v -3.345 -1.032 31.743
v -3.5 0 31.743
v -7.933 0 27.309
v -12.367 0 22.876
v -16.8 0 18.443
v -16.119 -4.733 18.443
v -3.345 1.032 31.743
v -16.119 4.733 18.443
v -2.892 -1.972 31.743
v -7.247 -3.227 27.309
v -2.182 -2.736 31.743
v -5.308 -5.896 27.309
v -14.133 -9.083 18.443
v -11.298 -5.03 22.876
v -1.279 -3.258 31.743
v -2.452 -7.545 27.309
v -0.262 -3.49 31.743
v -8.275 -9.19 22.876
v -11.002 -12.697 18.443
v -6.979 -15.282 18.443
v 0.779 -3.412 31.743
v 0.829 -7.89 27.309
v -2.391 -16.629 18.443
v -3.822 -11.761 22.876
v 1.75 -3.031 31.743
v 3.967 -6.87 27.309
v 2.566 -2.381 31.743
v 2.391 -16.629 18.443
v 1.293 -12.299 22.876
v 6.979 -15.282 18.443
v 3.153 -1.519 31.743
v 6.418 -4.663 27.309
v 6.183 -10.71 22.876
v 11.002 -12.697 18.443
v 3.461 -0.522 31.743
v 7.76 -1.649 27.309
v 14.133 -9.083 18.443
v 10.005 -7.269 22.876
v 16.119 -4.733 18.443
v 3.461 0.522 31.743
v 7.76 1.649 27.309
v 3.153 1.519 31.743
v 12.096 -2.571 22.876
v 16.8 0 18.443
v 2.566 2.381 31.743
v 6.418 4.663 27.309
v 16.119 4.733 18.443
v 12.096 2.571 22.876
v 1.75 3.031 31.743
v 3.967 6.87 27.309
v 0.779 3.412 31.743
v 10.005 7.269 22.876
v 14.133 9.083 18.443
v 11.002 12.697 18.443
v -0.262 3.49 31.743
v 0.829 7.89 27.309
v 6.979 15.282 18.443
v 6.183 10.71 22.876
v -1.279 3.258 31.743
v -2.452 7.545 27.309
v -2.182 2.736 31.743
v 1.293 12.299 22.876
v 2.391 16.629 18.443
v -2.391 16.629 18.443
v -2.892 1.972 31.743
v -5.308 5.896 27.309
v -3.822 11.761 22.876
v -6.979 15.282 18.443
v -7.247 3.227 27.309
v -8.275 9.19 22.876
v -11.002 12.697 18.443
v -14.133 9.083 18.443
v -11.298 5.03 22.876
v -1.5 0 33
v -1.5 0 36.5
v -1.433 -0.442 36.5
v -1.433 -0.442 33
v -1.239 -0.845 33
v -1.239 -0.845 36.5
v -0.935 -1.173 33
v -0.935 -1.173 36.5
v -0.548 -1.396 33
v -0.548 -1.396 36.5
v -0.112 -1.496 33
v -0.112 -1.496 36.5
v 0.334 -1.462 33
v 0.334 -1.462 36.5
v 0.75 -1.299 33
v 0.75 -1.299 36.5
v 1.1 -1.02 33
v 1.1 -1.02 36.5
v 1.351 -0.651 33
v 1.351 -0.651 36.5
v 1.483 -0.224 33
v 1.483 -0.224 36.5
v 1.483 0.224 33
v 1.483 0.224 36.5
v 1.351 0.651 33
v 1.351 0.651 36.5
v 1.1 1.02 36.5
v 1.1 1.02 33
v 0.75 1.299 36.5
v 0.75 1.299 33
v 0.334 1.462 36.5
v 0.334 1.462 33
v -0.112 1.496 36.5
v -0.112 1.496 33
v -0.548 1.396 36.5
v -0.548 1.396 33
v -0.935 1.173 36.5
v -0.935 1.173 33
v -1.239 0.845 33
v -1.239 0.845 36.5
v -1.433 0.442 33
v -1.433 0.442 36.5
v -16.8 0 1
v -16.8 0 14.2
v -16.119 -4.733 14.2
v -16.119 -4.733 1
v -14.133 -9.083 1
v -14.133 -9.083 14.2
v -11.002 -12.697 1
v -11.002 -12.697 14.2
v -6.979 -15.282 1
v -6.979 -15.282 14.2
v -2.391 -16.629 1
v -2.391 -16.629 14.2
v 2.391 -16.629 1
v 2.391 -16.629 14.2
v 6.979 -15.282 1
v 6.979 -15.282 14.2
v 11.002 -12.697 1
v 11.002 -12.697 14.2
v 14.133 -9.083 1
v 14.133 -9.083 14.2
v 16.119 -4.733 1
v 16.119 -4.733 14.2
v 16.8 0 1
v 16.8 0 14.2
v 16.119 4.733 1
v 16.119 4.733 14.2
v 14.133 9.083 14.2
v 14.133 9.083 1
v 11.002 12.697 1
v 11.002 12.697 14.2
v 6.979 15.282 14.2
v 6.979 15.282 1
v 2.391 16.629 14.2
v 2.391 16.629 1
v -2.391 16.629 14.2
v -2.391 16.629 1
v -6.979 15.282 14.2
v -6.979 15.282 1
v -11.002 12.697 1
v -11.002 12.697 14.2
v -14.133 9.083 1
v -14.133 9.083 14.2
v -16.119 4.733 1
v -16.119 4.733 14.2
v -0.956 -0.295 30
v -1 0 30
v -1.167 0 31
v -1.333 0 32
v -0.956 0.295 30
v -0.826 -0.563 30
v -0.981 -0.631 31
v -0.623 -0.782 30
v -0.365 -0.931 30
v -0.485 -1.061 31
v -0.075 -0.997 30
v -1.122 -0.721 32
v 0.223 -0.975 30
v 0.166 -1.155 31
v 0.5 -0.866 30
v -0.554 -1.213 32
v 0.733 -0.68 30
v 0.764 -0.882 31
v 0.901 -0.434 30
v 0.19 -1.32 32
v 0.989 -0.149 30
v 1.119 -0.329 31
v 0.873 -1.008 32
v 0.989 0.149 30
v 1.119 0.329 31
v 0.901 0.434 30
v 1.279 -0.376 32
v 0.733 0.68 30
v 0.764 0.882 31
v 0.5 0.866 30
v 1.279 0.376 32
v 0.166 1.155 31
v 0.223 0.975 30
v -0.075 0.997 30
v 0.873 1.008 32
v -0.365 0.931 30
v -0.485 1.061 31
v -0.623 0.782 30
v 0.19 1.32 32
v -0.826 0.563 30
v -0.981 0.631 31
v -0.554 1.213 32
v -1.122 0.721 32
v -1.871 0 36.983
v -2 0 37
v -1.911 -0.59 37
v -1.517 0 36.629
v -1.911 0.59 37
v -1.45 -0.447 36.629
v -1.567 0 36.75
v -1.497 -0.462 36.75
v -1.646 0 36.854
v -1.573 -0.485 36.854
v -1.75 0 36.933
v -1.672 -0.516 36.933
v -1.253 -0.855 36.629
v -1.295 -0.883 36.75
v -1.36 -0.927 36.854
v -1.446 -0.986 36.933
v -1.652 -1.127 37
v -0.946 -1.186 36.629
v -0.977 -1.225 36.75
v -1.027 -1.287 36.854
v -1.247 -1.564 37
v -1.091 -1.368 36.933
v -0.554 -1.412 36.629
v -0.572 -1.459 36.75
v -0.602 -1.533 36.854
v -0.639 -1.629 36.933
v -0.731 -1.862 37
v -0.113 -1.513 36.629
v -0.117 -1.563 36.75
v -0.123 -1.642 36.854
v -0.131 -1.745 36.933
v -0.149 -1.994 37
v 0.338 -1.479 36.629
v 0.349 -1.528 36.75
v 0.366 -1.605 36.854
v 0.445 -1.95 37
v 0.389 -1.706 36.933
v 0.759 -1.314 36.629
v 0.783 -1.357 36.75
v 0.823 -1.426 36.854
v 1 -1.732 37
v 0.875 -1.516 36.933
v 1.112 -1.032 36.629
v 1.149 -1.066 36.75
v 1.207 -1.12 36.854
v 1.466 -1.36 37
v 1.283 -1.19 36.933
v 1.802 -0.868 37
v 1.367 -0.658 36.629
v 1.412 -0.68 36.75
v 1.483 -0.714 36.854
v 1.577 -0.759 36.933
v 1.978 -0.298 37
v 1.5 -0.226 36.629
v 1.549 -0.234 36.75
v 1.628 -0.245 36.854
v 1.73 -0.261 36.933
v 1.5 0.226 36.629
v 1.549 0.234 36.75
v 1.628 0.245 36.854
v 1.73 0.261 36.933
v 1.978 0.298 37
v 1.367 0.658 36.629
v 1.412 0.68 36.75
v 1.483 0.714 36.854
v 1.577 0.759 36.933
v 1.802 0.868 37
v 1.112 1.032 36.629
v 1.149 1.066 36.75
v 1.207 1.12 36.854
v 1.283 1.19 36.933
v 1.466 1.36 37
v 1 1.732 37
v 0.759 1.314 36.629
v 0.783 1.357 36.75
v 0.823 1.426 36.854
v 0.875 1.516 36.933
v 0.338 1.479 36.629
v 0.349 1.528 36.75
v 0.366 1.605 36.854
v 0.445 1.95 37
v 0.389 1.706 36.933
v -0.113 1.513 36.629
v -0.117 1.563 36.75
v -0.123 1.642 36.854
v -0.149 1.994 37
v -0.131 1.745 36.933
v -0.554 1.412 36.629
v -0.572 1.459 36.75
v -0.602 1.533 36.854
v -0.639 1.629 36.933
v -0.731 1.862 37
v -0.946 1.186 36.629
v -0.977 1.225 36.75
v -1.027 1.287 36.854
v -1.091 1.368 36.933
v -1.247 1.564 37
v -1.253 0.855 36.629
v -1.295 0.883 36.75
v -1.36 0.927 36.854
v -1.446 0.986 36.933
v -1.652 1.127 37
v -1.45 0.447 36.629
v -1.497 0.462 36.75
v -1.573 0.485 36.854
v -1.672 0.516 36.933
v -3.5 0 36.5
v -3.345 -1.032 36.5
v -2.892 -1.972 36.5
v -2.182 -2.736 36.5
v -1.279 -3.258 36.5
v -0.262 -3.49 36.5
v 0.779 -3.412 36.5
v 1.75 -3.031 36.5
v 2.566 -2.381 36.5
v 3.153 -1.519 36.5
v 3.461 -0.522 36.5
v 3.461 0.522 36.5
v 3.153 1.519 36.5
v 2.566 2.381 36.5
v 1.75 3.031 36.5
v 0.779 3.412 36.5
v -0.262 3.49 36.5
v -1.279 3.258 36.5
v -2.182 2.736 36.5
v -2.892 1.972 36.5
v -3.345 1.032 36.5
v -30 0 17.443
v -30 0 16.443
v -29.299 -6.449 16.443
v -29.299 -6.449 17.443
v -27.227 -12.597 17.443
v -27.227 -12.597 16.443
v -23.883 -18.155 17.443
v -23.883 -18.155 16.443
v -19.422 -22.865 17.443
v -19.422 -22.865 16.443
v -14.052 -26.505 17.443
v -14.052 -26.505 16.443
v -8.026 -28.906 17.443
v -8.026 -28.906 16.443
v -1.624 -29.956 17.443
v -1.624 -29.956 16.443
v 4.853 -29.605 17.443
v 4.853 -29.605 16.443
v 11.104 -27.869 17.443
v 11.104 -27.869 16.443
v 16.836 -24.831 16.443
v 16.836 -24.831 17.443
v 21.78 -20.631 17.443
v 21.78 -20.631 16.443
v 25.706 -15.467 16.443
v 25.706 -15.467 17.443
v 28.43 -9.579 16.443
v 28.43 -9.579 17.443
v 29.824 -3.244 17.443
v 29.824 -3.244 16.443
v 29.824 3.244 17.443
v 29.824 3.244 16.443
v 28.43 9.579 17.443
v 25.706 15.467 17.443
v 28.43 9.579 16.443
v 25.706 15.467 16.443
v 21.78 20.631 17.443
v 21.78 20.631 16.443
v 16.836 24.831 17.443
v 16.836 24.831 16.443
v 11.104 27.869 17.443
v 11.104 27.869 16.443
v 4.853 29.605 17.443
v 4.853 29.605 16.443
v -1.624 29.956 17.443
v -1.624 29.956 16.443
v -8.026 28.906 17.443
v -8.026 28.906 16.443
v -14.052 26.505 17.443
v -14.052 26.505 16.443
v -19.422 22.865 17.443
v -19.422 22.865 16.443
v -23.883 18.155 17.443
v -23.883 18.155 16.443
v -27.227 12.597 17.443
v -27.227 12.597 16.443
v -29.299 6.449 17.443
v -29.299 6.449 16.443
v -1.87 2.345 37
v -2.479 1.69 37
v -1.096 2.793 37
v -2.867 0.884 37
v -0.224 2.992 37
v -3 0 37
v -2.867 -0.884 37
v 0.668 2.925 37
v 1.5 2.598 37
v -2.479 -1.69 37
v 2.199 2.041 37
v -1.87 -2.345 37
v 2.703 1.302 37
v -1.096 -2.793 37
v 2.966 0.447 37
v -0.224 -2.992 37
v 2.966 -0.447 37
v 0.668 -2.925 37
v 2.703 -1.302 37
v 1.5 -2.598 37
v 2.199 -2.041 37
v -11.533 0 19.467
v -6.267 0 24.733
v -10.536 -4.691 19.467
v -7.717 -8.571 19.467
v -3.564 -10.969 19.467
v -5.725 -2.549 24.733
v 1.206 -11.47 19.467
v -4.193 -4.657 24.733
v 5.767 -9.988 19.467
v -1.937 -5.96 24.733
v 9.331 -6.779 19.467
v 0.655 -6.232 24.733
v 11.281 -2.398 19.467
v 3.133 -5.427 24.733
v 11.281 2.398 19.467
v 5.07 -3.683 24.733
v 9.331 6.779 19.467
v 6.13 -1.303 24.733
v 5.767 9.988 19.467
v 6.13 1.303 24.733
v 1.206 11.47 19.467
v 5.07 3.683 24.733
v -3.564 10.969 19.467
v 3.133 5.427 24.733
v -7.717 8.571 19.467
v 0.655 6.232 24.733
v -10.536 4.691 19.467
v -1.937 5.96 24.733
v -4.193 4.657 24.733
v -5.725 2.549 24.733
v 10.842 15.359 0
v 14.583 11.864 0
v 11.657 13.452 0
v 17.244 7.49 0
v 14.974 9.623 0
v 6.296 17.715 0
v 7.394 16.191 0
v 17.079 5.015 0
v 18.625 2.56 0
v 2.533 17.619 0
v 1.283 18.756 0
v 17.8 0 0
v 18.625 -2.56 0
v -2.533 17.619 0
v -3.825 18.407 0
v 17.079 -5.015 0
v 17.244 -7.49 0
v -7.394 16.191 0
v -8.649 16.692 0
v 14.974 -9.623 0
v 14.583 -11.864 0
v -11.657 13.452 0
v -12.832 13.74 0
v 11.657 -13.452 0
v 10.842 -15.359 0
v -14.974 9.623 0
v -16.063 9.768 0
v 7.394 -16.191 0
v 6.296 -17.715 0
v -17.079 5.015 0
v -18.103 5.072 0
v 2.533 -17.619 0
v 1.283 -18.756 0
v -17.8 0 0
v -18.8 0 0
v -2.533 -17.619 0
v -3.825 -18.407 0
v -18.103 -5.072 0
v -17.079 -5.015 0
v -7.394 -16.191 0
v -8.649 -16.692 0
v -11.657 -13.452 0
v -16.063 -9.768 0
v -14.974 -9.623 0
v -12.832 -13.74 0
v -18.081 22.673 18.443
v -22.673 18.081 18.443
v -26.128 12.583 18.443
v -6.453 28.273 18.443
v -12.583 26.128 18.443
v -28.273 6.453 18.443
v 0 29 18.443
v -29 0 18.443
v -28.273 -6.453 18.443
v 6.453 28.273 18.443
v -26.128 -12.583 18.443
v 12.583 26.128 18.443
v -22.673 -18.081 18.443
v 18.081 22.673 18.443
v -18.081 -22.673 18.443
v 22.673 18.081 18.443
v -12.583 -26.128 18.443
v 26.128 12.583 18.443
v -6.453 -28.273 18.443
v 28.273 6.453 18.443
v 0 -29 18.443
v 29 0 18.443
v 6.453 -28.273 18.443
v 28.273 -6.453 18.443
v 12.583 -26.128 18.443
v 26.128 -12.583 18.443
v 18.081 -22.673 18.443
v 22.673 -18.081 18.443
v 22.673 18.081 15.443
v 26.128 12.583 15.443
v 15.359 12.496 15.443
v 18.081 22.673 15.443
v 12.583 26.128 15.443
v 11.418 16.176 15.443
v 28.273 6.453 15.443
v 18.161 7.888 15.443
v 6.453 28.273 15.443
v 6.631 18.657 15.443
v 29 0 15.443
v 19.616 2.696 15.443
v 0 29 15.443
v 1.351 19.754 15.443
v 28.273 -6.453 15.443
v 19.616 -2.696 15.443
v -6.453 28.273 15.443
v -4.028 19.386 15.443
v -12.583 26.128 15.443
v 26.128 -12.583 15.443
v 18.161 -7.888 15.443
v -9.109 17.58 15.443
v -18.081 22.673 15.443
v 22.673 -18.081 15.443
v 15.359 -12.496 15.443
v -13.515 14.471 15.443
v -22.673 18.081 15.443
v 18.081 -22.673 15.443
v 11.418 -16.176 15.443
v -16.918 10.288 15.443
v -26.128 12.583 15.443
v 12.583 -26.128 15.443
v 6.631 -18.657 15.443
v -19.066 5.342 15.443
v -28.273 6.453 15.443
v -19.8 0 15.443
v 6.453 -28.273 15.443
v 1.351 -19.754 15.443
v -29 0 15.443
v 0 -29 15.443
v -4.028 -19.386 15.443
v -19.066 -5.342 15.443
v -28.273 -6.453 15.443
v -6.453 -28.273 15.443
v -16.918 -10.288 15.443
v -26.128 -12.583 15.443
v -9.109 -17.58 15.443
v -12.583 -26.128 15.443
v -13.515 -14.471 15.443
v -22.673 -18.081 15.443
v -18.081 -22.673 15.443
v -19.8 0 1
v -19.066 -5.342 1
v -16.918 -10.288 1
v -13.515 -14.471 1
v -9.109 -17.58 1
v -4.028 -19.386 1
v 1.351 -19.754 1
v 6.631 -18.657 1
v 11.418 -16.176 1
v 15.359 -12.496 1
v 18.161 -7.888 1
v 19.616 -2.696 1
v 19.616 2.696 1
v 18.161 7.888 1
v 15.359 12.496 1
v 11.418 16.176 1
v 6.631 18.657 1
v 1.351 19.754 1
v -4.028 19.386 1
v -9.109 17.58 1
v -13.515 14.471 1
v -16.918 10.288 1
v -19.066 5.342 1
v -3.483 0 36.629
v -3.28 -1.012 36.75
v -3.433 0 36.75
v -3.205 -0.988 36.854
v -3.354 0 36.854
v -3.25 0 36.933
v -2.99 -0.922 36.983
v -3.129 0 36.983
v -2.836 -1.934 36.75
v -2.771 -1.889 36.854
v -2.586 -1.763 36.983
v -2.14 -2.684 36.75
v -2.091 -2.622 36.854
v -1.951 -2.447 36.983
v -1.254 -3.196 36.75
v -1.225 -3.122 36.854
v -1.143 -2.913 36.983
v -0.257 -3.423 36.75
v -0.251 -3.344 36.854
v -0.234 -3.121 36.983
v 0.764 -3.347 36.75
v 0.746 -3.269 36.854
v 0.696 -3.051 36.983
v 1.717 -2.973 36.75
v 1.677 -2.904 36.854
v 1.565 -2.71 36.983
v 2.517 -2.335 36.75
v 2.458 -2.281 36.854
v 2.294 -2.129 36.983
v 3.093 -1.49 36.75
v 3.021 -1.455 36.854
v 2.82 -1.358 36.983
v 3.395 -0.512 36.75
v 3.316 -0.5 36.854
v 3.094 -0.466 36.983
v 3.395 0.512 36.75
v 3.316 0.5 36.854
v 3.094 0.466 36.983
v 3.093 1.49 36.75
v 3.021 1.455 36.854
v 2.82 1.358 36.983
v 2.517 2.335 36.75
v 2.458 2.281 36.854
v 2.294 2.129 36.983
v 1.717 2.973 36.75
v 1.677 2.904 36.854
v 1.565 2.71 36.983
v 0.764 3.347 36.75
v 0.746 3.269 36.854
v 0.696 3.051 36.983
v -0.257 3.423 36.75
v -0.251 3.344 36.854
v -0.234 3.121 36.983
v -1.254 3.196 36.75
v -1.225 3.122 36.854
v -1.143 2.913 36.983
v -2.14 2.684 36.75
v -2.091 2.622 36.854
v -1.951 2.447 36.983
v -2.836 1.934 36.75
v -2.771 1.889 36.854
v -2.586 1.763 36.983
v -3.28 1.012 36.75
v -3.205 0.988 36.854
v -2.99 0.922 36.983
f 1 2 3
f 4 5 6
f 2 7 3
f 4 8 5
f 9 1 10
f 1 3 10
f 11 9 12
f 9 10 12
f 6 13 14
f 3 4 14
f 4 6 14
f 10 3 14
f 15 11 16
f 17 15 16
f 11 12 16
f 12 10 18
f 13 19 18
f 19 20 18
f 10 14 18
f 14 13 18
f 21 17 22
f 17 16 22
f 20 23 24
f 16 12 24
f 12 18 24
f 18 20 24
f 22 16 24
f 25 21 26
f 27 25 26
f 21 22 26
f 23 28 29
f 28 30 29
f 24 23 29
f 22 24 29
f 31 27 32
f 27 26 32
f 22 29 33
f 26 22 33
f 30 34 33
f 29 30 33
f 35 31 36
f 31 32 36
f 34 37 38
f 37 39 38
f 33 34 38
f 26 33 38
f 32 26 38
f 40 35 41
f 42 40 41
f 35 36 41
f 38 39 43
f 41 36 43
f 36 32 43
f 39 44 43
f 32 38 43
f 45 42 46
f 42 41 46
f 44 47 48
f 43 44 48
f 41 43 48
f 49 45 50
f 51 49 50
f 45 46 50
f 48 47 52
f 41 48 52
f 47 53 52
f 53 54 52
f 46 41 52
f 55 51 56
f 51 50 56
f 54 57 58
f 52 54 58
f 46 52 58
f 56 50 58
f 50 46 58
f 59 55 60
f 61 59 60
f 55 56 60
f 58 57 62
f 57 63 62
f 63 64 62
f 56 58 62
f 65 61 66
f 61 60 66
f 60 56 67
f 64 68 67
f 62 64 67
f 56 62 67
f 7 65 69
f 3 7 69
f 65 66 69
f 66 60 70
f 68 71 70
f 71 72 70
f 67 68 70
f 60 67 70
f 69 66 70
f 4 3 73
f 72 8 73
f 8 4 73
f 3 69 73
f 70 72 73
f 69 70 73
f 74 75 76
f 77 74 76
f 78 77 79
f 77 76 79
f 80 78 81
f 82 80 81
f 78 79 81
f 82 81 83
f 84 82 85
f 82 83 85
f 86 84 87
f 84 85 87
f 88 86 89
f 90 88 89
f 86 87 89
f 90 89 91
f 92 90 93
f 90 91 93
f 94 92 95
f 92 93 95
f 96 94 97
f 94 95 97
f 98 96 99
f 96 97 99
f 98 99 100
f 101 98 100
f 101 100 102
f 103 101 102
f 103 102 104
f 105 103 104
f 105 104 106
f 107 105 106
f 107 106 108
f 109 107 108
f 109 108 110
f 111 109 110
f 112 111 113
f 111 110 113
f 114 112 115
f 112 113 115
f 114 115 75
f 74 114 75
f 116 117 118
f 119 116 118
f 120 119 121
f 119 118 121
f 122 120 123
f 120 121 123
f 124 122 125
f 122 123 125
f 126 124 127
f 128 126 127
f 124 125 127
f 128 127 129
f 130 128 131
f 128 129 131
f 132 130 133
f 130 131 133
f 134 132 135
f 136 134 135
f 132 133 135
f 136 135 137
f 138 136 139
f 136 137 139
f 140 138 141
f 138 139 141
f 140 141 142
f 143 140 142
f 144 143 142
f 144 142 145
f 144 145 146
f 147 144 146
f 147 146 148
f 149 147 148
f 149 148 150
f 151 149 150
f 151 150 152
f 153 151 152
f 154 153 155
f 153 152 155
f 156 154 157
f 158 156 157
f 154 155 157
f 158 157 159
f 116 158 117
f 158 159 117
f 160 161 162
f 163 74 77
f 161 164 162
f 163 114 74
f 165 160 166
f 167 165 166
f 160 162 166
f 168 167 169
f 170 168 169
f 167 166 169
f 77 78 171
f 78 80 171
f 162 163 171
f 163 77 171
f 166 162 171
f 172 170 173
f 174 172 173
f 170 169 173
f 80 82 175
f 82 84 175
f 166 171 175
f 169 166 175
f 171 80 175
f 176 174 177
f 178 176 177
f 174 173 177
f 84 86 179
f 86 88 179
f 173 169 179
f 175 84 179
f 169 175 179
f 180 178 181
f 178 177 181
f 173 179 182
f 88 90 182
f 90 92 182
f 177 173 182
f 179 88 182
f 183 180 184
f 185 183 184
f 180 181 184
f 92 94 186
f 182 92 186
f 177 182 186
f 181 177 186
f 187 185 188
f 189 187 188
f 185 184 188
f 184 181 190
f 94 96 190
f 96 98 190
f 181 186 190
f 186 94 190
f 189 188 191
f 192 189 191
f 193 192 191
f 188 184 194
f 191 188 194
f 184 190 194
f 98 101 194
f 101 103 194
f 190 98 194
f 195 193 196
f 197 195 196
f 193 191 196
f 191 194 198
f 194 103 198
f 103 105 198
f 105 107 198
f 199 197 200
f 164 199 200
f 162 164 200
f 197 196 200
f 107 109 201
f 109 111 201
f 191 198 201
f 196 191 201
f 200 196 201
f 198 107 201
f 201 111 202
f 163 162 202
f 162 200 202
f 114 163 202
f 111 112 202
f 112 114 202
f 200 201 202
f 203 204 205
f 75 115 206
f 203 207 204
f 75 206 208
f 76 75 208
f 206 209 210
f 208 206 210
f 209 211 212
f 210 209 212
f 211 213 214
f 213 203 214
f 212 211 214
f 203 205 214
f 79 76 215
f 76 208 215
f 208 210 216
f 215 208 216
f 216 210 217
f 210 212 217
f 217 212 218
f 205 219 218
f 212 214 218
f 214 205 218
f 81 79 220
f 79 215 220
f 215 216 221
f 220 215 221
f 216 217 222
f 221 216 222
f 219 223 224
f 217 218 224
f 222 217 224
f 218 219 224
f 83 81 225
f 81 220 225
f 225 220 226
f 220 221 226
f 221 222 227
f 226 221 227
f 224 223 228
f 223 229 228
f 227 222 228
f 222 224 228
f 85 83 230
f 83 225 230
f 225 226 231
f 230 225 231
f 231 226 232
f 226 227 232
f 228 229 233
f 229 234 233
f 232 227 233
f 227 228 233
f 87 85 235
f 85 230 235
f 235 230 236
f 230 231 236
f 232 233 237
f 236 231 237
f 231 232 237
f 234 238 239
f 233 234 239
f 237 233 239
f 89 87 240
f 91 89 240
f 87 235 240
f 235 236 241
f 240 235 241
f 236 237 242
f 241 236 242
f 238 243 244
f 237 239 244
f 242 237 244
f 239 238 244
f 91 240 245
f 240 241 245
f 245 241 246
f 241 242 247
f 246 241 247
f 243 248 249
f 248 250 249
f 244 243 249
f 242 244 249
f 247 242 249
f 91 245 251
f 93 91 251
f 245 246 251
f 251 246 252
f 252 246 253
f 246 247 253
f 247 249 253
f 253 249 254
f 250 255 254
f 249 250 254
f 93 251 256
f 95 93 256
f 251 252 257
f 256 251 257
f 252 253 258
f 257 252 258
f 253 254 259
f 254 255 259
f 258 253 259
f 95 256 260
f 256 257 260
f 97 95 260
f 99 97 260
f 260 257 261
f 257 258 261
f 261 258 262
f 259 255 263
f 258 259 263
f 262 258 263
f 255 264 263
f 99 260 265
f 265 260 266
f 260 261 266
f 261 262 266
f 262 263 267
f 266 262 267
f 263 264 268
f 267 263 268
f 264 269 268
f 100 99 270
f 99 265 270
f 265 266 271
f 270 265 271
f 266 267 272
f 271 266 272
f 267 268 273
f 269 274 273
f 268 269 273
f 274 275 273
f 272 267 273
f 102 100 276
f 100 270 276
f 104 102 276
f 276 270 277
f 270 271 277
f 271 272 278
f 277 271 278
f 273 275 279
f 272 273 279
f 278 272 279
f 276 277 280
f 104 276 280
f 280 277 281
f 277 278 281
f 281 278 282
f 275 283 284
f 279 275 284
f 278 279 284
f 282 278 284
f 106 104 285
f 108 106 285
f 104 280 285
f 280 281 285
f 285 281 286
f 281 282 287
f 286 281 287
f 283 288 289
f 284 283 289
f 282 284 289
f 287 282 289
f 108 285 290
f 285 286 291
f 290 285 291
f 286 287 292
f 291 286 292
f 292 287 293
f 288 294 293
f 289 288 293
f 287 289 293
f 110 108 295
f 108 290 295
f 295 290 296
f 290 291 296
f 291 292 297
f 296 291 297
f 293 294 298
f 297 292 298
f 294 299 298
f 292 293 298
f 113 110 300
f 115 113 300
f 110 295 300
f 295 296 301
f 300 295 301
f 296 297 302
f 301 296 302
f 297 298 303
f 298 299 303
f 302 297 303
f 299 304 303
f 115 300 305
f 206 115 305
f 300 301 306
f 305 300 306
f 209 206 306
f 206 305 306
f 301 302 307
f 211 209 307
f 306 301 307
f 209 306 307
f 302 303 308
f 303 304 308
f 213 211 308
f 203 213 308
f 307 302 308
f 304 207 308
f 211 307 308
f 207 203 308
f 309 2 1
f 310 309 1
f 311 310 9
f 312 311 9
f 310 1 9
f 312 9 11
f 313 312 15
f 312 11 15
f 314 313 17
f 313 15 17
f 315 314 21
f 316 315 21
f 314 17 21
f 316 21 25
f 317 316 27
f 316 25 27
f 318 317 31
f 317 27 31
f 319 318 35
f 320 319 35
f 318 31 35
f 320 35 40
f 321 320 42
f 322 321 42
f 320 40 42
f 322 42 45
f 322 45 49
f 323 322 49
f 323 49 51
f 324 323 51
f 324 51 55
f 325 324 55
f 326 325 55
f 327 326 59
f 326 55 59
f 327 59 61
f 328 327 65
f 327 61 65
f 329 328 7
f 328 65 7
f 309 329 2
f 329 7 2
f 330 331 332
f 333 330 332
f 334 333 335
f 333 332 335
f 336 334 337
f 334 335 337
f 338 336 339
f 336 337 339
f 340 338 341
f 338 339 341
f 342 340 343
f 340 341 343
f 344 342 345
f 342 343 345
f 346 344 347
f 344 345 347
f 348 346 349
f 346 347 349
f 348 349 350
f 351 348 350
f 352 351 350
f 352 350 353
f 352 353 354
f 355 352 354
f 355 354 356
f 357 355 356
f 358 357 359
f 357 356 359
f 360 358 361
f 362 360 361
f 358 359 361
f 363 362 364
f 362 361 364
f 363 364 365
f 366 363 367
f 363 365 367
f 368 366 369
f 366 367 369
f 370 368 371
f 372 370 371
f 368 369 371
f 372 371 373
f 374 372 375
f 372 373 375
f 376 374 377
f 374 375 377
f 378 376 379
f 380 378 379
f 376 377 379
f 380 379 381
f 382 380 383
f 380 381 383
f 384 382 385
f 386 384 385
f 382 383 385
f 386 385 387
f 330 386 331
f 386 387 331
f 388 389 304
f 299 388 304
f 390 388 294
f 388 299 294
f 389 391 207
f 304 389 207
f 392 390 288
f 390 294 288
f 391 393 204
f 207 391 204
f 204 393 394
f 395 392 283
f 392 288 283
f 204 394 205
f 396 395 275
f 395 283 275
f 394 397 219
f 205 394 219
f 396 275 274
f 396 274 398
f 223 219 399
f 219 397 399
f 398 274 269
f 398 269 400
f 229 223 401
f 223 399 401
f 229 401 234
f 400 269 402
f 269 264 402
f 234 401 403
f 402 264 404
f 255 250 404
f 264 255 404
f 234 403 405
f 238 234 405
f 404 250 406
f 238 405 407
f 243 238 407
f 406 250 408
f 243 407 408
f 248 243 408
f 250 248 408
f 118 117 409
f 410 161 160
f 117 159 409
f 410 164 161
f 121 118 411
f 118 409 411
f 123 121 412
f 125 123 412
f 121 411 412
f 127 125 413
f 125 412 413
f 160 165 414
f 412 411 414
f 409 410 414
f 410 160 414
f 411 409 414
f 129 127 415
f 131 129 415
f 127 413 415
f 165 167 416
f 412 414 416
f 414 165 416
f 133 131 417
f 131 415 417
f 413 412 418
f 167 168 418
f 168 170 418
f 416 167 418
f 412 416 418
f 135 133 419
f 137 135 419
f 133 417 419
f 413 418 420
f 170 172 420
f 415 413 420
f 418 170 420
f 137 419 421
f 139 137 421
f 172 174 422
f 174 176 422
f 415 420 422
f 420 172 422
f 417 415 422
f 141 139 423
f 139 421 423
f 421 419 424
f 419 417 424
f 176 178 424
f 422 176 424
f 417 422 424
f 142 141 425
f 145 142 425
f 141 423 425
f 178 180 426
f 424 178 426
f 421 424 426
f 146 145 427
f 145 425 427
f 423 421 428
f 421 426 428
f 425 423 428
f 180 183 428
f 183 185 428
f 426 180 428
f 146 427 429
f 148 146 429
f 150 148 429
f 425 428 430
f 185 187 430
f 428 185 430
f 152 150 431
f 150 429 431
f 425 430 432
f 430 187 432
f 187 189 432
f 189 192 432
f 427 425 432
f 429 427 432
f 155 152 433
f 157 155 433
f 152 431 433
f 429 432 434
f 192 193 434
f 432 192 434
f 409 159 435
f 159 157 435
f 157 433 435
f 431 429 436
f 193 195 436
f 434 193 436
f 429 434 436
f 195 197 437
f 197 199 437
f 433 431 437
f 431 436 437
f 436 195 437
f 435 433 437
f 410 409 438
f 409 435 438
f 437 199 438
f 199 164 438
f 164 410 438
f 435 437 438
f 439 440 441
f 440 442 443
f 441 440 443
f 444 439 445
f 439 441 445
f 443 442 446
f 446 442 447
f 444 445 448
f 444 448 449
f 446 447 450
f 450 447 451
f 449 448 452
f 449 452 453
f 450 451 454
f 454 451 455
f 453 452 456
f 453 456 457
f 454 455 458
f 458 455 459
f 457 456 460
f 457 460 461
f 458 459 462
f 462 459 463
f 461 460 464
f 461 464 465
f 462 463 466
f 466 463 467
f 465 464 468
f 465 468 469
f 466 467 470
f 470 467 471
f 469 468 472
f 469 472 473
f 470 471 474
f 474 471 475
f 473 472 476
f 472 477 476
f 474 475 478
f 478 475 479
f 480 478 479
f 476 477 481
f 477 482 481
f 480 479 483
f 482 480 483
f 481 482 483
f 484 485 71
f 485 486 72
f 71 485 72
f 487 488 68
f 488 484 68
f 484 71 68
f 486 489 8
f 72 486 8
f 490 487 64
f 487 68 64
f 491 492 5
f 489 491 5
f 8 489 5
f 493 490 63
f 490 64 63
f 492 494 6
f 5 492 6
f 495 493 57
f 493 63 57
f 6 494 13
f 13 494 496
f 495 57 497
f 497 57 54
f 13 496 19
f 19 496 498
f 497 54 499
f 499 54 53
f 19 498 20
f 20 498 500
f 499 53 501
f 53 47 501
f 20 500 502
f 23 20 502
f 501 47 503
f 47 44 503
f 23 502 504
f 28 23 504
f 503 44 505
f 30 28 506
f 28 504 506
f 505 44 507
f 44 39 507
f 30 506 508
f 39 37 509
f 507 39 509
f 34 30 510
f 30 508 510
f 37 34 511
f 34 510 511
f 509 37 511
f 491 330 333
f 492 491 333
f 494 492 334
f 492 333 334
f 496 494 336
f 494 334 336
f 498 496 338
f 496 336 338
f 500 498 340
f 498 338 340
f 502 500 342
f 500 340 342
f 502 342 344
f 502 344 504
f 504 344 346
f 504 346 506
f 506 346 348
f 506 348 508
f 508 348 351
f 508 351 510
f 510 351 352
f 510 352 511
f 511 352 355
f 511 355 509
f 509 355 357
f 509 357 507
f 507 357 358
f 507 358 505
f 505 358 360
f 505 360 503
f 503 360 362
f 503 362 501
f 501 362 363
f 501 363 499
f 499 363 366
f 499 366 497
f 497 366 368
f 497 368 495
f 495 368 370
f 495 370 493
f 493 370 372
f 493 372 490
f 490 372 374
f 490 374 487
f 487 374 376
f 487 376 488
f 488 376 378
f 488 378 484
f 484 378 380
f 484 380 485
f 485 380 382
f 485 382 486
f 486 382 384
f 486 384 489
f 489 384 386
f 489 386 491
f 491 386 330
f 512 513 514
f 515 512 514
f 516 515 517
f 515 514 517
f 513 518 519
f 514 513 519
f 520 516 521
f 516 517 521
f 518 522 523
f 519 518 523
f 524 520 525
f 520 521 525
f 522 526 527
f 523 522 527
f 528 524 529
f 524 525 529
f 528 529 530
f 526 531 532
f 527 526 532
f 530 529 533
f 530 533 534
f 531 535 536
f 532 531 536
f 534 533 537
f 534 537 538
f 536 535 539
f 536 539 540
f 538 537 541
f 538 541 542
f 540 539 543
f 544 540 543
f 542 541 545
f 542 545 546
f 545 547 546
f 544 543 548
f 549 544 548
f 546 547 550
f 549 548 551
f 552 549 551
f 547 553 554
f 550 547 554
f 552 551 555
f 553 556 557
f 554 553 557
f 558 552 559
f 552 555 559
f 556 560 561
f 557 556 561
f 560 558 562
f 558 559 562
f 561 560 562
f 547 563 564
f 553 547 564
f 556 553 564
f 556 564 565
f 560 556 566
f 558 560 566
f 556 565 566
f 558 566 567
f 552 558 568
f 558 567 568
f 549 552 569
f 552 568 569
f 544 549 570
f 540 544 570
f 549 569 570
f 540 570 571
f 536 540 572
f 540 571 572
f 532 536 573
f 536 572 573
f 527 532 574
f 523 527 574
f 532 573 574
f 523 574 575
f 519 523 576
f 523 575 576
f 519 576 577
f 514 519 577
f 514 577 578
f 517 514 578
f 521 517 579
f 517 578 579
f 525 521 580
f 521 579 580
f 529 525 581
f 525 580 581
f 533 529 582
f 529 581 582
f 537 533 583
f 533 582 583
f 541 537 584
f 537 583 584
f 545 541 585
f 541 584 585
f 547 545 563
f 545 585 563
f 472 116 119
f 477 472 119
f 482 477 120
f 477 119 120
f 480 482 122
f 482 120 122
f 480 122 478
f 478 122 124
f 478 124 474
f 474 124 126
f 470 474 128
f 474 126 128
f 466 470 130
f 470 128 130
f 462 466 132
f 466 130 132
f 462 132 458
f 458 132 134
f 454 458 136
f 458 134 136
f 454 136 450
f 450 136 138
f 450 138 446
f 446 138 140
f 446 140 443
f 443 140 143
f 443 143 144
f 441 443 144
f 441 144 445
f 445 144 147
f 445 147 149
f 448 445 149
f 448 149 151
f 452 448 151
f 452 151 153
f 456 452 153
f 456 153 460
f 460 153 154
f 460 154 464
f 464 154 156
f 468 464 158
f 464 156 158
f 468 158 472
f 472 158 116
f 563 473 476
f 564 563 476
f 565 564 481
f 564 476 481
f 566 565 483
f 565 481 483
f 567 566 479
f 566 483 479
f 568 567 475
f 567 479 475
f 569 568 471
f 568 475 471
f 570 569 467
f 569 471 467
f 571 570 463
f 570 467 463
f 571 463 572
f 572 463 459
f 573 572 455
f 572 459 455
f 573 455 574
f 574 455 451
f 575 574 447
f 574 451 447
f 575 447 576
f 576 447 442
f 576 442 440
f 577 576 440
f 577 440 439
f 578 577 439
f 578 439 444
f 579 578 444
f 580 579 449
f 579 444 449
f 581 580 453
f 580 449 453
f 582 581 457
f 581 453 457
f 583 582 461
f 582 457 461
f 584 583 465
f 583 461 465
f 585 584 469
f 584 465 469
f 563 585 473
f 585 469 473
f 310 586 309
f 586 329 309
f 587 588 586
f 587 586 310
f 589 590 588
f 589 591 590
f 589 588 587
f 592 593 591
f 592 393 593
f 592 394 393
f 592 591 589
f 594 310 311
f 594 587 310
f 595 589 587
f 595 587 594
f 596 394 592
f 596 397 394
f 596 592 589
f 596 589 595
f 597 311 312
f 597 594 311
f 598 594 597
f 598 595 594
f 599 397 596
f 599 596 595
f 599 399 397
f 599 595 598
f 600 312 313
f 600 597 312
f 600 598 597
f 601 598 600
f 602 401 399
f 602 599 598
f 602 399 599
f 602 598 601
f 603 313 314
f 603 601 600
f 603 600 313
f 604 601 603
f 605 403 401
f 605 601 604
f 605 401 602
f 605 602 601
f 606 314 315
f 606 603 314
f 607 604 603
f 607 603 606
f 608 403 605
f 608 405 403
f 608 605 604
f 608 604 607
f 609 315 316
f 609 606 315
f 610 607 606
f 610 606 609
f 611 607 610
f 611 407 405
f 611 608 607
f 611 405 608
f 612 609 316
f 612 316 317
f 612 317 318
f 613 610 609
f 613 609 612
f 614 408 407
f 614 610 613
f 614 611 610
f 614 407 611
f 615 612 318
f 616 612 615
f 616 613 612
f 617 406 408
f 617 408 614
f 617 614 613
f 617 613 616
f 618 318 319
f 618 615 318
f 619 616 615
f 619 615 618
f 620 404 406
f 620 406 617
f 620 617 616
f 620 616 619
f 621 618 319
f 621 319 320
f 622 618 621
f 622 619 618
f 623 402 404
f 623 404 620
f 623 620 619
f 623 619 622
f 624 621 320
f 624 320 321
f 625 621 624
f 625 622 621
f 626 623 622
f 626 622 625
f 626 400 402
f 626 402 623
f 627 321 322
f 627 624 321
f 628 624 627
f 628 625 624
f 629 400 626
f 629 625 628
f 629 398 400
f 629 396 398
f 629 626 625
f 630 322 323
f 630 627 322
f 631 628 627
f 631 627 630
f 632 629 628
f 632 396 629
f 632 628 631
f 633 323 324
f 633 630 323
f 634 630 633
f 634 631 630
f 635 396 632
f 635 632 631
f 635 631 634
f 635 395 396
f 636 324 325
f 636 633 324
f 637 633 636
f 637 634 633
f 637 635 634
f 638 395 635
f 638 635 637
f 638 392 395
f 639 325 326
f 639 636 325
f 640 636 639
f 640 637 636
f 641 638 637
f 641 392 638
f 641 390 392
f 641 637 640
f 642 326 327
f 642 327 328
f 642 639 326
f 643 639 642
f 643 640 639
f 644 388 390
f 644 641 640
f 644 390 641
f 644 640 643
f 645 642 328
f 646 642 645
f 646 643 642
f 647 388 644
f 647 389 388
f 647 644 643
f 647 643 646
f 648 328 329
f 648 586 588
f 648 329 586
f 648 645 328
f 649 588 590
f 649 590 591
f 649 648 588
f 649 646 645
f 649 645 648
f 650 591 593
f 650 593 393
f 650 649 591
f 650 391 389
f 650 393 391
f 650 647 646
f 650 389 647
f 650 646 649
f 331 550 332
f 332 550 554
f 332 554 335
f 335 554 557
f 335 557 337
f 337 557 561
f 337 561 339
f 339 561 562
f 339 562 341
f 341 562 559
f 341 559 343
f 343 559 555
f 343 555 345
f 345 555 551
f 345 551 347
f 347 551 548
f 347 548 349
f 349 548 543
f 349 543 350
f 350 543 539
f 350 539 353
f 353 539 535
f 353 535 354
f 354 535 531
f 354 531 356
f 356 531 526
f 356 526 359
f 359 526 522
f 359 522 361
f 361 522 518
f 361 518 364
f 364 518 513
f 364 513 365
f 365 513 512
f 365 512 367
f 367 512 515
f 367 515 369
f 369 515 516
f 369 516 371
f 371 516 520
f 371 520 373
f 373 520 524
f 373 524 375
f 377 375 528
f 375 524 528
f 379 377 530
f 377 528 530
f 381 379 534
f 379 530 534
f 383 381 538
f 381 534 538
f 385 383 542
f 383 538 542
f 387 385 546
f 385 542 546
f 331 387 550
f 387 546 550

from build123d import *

# Parameters (mm, degrees)
F2_SIZE = 1
F3_R    = 0.5


# Not quite as in the source:
# - a feature names something its author has since deleted; it is built from what else it names


with BuildPart() as f1:
    # F0 (on Front) → F1 (revolve)
    with BuildSketch(Plane.XZ):
        Polygon((-19.8, 15.4426406871), (-19.8, 0), (-16.8, 0), (-16.8, 14.2), (-1, 30), (-1.5, 33), (-1.5, 37), (-3.5, 37), (-3.5, 31.7426406871), (-16.8, 18.4426406871), (-30, 18.4426406871), (-30, 15.4426406871), align=None)
    revolve(axis=Axis((0, 0, 35), (0, 0, 1)))

    # F2
    f2_edges = [f1.edges().sort_by_distance(p)[0] for p in [
        (30, 0, 18.442641),
        (30, 0, 15.442641),
        (19.8, 0, 0),
        (16.8, 0, 0),
    ]]
    chamfer(f2_edges, length=F2_SIZE)

    # F3
    f3_edges = [f1.edges().sort_by_distance(p)[0] for p in [
        (1.5, 0, 37),
        (3.5, 0, 37),
    ]]
    fillet(f3_edges, radius=F3_R)


solid = f1.part
